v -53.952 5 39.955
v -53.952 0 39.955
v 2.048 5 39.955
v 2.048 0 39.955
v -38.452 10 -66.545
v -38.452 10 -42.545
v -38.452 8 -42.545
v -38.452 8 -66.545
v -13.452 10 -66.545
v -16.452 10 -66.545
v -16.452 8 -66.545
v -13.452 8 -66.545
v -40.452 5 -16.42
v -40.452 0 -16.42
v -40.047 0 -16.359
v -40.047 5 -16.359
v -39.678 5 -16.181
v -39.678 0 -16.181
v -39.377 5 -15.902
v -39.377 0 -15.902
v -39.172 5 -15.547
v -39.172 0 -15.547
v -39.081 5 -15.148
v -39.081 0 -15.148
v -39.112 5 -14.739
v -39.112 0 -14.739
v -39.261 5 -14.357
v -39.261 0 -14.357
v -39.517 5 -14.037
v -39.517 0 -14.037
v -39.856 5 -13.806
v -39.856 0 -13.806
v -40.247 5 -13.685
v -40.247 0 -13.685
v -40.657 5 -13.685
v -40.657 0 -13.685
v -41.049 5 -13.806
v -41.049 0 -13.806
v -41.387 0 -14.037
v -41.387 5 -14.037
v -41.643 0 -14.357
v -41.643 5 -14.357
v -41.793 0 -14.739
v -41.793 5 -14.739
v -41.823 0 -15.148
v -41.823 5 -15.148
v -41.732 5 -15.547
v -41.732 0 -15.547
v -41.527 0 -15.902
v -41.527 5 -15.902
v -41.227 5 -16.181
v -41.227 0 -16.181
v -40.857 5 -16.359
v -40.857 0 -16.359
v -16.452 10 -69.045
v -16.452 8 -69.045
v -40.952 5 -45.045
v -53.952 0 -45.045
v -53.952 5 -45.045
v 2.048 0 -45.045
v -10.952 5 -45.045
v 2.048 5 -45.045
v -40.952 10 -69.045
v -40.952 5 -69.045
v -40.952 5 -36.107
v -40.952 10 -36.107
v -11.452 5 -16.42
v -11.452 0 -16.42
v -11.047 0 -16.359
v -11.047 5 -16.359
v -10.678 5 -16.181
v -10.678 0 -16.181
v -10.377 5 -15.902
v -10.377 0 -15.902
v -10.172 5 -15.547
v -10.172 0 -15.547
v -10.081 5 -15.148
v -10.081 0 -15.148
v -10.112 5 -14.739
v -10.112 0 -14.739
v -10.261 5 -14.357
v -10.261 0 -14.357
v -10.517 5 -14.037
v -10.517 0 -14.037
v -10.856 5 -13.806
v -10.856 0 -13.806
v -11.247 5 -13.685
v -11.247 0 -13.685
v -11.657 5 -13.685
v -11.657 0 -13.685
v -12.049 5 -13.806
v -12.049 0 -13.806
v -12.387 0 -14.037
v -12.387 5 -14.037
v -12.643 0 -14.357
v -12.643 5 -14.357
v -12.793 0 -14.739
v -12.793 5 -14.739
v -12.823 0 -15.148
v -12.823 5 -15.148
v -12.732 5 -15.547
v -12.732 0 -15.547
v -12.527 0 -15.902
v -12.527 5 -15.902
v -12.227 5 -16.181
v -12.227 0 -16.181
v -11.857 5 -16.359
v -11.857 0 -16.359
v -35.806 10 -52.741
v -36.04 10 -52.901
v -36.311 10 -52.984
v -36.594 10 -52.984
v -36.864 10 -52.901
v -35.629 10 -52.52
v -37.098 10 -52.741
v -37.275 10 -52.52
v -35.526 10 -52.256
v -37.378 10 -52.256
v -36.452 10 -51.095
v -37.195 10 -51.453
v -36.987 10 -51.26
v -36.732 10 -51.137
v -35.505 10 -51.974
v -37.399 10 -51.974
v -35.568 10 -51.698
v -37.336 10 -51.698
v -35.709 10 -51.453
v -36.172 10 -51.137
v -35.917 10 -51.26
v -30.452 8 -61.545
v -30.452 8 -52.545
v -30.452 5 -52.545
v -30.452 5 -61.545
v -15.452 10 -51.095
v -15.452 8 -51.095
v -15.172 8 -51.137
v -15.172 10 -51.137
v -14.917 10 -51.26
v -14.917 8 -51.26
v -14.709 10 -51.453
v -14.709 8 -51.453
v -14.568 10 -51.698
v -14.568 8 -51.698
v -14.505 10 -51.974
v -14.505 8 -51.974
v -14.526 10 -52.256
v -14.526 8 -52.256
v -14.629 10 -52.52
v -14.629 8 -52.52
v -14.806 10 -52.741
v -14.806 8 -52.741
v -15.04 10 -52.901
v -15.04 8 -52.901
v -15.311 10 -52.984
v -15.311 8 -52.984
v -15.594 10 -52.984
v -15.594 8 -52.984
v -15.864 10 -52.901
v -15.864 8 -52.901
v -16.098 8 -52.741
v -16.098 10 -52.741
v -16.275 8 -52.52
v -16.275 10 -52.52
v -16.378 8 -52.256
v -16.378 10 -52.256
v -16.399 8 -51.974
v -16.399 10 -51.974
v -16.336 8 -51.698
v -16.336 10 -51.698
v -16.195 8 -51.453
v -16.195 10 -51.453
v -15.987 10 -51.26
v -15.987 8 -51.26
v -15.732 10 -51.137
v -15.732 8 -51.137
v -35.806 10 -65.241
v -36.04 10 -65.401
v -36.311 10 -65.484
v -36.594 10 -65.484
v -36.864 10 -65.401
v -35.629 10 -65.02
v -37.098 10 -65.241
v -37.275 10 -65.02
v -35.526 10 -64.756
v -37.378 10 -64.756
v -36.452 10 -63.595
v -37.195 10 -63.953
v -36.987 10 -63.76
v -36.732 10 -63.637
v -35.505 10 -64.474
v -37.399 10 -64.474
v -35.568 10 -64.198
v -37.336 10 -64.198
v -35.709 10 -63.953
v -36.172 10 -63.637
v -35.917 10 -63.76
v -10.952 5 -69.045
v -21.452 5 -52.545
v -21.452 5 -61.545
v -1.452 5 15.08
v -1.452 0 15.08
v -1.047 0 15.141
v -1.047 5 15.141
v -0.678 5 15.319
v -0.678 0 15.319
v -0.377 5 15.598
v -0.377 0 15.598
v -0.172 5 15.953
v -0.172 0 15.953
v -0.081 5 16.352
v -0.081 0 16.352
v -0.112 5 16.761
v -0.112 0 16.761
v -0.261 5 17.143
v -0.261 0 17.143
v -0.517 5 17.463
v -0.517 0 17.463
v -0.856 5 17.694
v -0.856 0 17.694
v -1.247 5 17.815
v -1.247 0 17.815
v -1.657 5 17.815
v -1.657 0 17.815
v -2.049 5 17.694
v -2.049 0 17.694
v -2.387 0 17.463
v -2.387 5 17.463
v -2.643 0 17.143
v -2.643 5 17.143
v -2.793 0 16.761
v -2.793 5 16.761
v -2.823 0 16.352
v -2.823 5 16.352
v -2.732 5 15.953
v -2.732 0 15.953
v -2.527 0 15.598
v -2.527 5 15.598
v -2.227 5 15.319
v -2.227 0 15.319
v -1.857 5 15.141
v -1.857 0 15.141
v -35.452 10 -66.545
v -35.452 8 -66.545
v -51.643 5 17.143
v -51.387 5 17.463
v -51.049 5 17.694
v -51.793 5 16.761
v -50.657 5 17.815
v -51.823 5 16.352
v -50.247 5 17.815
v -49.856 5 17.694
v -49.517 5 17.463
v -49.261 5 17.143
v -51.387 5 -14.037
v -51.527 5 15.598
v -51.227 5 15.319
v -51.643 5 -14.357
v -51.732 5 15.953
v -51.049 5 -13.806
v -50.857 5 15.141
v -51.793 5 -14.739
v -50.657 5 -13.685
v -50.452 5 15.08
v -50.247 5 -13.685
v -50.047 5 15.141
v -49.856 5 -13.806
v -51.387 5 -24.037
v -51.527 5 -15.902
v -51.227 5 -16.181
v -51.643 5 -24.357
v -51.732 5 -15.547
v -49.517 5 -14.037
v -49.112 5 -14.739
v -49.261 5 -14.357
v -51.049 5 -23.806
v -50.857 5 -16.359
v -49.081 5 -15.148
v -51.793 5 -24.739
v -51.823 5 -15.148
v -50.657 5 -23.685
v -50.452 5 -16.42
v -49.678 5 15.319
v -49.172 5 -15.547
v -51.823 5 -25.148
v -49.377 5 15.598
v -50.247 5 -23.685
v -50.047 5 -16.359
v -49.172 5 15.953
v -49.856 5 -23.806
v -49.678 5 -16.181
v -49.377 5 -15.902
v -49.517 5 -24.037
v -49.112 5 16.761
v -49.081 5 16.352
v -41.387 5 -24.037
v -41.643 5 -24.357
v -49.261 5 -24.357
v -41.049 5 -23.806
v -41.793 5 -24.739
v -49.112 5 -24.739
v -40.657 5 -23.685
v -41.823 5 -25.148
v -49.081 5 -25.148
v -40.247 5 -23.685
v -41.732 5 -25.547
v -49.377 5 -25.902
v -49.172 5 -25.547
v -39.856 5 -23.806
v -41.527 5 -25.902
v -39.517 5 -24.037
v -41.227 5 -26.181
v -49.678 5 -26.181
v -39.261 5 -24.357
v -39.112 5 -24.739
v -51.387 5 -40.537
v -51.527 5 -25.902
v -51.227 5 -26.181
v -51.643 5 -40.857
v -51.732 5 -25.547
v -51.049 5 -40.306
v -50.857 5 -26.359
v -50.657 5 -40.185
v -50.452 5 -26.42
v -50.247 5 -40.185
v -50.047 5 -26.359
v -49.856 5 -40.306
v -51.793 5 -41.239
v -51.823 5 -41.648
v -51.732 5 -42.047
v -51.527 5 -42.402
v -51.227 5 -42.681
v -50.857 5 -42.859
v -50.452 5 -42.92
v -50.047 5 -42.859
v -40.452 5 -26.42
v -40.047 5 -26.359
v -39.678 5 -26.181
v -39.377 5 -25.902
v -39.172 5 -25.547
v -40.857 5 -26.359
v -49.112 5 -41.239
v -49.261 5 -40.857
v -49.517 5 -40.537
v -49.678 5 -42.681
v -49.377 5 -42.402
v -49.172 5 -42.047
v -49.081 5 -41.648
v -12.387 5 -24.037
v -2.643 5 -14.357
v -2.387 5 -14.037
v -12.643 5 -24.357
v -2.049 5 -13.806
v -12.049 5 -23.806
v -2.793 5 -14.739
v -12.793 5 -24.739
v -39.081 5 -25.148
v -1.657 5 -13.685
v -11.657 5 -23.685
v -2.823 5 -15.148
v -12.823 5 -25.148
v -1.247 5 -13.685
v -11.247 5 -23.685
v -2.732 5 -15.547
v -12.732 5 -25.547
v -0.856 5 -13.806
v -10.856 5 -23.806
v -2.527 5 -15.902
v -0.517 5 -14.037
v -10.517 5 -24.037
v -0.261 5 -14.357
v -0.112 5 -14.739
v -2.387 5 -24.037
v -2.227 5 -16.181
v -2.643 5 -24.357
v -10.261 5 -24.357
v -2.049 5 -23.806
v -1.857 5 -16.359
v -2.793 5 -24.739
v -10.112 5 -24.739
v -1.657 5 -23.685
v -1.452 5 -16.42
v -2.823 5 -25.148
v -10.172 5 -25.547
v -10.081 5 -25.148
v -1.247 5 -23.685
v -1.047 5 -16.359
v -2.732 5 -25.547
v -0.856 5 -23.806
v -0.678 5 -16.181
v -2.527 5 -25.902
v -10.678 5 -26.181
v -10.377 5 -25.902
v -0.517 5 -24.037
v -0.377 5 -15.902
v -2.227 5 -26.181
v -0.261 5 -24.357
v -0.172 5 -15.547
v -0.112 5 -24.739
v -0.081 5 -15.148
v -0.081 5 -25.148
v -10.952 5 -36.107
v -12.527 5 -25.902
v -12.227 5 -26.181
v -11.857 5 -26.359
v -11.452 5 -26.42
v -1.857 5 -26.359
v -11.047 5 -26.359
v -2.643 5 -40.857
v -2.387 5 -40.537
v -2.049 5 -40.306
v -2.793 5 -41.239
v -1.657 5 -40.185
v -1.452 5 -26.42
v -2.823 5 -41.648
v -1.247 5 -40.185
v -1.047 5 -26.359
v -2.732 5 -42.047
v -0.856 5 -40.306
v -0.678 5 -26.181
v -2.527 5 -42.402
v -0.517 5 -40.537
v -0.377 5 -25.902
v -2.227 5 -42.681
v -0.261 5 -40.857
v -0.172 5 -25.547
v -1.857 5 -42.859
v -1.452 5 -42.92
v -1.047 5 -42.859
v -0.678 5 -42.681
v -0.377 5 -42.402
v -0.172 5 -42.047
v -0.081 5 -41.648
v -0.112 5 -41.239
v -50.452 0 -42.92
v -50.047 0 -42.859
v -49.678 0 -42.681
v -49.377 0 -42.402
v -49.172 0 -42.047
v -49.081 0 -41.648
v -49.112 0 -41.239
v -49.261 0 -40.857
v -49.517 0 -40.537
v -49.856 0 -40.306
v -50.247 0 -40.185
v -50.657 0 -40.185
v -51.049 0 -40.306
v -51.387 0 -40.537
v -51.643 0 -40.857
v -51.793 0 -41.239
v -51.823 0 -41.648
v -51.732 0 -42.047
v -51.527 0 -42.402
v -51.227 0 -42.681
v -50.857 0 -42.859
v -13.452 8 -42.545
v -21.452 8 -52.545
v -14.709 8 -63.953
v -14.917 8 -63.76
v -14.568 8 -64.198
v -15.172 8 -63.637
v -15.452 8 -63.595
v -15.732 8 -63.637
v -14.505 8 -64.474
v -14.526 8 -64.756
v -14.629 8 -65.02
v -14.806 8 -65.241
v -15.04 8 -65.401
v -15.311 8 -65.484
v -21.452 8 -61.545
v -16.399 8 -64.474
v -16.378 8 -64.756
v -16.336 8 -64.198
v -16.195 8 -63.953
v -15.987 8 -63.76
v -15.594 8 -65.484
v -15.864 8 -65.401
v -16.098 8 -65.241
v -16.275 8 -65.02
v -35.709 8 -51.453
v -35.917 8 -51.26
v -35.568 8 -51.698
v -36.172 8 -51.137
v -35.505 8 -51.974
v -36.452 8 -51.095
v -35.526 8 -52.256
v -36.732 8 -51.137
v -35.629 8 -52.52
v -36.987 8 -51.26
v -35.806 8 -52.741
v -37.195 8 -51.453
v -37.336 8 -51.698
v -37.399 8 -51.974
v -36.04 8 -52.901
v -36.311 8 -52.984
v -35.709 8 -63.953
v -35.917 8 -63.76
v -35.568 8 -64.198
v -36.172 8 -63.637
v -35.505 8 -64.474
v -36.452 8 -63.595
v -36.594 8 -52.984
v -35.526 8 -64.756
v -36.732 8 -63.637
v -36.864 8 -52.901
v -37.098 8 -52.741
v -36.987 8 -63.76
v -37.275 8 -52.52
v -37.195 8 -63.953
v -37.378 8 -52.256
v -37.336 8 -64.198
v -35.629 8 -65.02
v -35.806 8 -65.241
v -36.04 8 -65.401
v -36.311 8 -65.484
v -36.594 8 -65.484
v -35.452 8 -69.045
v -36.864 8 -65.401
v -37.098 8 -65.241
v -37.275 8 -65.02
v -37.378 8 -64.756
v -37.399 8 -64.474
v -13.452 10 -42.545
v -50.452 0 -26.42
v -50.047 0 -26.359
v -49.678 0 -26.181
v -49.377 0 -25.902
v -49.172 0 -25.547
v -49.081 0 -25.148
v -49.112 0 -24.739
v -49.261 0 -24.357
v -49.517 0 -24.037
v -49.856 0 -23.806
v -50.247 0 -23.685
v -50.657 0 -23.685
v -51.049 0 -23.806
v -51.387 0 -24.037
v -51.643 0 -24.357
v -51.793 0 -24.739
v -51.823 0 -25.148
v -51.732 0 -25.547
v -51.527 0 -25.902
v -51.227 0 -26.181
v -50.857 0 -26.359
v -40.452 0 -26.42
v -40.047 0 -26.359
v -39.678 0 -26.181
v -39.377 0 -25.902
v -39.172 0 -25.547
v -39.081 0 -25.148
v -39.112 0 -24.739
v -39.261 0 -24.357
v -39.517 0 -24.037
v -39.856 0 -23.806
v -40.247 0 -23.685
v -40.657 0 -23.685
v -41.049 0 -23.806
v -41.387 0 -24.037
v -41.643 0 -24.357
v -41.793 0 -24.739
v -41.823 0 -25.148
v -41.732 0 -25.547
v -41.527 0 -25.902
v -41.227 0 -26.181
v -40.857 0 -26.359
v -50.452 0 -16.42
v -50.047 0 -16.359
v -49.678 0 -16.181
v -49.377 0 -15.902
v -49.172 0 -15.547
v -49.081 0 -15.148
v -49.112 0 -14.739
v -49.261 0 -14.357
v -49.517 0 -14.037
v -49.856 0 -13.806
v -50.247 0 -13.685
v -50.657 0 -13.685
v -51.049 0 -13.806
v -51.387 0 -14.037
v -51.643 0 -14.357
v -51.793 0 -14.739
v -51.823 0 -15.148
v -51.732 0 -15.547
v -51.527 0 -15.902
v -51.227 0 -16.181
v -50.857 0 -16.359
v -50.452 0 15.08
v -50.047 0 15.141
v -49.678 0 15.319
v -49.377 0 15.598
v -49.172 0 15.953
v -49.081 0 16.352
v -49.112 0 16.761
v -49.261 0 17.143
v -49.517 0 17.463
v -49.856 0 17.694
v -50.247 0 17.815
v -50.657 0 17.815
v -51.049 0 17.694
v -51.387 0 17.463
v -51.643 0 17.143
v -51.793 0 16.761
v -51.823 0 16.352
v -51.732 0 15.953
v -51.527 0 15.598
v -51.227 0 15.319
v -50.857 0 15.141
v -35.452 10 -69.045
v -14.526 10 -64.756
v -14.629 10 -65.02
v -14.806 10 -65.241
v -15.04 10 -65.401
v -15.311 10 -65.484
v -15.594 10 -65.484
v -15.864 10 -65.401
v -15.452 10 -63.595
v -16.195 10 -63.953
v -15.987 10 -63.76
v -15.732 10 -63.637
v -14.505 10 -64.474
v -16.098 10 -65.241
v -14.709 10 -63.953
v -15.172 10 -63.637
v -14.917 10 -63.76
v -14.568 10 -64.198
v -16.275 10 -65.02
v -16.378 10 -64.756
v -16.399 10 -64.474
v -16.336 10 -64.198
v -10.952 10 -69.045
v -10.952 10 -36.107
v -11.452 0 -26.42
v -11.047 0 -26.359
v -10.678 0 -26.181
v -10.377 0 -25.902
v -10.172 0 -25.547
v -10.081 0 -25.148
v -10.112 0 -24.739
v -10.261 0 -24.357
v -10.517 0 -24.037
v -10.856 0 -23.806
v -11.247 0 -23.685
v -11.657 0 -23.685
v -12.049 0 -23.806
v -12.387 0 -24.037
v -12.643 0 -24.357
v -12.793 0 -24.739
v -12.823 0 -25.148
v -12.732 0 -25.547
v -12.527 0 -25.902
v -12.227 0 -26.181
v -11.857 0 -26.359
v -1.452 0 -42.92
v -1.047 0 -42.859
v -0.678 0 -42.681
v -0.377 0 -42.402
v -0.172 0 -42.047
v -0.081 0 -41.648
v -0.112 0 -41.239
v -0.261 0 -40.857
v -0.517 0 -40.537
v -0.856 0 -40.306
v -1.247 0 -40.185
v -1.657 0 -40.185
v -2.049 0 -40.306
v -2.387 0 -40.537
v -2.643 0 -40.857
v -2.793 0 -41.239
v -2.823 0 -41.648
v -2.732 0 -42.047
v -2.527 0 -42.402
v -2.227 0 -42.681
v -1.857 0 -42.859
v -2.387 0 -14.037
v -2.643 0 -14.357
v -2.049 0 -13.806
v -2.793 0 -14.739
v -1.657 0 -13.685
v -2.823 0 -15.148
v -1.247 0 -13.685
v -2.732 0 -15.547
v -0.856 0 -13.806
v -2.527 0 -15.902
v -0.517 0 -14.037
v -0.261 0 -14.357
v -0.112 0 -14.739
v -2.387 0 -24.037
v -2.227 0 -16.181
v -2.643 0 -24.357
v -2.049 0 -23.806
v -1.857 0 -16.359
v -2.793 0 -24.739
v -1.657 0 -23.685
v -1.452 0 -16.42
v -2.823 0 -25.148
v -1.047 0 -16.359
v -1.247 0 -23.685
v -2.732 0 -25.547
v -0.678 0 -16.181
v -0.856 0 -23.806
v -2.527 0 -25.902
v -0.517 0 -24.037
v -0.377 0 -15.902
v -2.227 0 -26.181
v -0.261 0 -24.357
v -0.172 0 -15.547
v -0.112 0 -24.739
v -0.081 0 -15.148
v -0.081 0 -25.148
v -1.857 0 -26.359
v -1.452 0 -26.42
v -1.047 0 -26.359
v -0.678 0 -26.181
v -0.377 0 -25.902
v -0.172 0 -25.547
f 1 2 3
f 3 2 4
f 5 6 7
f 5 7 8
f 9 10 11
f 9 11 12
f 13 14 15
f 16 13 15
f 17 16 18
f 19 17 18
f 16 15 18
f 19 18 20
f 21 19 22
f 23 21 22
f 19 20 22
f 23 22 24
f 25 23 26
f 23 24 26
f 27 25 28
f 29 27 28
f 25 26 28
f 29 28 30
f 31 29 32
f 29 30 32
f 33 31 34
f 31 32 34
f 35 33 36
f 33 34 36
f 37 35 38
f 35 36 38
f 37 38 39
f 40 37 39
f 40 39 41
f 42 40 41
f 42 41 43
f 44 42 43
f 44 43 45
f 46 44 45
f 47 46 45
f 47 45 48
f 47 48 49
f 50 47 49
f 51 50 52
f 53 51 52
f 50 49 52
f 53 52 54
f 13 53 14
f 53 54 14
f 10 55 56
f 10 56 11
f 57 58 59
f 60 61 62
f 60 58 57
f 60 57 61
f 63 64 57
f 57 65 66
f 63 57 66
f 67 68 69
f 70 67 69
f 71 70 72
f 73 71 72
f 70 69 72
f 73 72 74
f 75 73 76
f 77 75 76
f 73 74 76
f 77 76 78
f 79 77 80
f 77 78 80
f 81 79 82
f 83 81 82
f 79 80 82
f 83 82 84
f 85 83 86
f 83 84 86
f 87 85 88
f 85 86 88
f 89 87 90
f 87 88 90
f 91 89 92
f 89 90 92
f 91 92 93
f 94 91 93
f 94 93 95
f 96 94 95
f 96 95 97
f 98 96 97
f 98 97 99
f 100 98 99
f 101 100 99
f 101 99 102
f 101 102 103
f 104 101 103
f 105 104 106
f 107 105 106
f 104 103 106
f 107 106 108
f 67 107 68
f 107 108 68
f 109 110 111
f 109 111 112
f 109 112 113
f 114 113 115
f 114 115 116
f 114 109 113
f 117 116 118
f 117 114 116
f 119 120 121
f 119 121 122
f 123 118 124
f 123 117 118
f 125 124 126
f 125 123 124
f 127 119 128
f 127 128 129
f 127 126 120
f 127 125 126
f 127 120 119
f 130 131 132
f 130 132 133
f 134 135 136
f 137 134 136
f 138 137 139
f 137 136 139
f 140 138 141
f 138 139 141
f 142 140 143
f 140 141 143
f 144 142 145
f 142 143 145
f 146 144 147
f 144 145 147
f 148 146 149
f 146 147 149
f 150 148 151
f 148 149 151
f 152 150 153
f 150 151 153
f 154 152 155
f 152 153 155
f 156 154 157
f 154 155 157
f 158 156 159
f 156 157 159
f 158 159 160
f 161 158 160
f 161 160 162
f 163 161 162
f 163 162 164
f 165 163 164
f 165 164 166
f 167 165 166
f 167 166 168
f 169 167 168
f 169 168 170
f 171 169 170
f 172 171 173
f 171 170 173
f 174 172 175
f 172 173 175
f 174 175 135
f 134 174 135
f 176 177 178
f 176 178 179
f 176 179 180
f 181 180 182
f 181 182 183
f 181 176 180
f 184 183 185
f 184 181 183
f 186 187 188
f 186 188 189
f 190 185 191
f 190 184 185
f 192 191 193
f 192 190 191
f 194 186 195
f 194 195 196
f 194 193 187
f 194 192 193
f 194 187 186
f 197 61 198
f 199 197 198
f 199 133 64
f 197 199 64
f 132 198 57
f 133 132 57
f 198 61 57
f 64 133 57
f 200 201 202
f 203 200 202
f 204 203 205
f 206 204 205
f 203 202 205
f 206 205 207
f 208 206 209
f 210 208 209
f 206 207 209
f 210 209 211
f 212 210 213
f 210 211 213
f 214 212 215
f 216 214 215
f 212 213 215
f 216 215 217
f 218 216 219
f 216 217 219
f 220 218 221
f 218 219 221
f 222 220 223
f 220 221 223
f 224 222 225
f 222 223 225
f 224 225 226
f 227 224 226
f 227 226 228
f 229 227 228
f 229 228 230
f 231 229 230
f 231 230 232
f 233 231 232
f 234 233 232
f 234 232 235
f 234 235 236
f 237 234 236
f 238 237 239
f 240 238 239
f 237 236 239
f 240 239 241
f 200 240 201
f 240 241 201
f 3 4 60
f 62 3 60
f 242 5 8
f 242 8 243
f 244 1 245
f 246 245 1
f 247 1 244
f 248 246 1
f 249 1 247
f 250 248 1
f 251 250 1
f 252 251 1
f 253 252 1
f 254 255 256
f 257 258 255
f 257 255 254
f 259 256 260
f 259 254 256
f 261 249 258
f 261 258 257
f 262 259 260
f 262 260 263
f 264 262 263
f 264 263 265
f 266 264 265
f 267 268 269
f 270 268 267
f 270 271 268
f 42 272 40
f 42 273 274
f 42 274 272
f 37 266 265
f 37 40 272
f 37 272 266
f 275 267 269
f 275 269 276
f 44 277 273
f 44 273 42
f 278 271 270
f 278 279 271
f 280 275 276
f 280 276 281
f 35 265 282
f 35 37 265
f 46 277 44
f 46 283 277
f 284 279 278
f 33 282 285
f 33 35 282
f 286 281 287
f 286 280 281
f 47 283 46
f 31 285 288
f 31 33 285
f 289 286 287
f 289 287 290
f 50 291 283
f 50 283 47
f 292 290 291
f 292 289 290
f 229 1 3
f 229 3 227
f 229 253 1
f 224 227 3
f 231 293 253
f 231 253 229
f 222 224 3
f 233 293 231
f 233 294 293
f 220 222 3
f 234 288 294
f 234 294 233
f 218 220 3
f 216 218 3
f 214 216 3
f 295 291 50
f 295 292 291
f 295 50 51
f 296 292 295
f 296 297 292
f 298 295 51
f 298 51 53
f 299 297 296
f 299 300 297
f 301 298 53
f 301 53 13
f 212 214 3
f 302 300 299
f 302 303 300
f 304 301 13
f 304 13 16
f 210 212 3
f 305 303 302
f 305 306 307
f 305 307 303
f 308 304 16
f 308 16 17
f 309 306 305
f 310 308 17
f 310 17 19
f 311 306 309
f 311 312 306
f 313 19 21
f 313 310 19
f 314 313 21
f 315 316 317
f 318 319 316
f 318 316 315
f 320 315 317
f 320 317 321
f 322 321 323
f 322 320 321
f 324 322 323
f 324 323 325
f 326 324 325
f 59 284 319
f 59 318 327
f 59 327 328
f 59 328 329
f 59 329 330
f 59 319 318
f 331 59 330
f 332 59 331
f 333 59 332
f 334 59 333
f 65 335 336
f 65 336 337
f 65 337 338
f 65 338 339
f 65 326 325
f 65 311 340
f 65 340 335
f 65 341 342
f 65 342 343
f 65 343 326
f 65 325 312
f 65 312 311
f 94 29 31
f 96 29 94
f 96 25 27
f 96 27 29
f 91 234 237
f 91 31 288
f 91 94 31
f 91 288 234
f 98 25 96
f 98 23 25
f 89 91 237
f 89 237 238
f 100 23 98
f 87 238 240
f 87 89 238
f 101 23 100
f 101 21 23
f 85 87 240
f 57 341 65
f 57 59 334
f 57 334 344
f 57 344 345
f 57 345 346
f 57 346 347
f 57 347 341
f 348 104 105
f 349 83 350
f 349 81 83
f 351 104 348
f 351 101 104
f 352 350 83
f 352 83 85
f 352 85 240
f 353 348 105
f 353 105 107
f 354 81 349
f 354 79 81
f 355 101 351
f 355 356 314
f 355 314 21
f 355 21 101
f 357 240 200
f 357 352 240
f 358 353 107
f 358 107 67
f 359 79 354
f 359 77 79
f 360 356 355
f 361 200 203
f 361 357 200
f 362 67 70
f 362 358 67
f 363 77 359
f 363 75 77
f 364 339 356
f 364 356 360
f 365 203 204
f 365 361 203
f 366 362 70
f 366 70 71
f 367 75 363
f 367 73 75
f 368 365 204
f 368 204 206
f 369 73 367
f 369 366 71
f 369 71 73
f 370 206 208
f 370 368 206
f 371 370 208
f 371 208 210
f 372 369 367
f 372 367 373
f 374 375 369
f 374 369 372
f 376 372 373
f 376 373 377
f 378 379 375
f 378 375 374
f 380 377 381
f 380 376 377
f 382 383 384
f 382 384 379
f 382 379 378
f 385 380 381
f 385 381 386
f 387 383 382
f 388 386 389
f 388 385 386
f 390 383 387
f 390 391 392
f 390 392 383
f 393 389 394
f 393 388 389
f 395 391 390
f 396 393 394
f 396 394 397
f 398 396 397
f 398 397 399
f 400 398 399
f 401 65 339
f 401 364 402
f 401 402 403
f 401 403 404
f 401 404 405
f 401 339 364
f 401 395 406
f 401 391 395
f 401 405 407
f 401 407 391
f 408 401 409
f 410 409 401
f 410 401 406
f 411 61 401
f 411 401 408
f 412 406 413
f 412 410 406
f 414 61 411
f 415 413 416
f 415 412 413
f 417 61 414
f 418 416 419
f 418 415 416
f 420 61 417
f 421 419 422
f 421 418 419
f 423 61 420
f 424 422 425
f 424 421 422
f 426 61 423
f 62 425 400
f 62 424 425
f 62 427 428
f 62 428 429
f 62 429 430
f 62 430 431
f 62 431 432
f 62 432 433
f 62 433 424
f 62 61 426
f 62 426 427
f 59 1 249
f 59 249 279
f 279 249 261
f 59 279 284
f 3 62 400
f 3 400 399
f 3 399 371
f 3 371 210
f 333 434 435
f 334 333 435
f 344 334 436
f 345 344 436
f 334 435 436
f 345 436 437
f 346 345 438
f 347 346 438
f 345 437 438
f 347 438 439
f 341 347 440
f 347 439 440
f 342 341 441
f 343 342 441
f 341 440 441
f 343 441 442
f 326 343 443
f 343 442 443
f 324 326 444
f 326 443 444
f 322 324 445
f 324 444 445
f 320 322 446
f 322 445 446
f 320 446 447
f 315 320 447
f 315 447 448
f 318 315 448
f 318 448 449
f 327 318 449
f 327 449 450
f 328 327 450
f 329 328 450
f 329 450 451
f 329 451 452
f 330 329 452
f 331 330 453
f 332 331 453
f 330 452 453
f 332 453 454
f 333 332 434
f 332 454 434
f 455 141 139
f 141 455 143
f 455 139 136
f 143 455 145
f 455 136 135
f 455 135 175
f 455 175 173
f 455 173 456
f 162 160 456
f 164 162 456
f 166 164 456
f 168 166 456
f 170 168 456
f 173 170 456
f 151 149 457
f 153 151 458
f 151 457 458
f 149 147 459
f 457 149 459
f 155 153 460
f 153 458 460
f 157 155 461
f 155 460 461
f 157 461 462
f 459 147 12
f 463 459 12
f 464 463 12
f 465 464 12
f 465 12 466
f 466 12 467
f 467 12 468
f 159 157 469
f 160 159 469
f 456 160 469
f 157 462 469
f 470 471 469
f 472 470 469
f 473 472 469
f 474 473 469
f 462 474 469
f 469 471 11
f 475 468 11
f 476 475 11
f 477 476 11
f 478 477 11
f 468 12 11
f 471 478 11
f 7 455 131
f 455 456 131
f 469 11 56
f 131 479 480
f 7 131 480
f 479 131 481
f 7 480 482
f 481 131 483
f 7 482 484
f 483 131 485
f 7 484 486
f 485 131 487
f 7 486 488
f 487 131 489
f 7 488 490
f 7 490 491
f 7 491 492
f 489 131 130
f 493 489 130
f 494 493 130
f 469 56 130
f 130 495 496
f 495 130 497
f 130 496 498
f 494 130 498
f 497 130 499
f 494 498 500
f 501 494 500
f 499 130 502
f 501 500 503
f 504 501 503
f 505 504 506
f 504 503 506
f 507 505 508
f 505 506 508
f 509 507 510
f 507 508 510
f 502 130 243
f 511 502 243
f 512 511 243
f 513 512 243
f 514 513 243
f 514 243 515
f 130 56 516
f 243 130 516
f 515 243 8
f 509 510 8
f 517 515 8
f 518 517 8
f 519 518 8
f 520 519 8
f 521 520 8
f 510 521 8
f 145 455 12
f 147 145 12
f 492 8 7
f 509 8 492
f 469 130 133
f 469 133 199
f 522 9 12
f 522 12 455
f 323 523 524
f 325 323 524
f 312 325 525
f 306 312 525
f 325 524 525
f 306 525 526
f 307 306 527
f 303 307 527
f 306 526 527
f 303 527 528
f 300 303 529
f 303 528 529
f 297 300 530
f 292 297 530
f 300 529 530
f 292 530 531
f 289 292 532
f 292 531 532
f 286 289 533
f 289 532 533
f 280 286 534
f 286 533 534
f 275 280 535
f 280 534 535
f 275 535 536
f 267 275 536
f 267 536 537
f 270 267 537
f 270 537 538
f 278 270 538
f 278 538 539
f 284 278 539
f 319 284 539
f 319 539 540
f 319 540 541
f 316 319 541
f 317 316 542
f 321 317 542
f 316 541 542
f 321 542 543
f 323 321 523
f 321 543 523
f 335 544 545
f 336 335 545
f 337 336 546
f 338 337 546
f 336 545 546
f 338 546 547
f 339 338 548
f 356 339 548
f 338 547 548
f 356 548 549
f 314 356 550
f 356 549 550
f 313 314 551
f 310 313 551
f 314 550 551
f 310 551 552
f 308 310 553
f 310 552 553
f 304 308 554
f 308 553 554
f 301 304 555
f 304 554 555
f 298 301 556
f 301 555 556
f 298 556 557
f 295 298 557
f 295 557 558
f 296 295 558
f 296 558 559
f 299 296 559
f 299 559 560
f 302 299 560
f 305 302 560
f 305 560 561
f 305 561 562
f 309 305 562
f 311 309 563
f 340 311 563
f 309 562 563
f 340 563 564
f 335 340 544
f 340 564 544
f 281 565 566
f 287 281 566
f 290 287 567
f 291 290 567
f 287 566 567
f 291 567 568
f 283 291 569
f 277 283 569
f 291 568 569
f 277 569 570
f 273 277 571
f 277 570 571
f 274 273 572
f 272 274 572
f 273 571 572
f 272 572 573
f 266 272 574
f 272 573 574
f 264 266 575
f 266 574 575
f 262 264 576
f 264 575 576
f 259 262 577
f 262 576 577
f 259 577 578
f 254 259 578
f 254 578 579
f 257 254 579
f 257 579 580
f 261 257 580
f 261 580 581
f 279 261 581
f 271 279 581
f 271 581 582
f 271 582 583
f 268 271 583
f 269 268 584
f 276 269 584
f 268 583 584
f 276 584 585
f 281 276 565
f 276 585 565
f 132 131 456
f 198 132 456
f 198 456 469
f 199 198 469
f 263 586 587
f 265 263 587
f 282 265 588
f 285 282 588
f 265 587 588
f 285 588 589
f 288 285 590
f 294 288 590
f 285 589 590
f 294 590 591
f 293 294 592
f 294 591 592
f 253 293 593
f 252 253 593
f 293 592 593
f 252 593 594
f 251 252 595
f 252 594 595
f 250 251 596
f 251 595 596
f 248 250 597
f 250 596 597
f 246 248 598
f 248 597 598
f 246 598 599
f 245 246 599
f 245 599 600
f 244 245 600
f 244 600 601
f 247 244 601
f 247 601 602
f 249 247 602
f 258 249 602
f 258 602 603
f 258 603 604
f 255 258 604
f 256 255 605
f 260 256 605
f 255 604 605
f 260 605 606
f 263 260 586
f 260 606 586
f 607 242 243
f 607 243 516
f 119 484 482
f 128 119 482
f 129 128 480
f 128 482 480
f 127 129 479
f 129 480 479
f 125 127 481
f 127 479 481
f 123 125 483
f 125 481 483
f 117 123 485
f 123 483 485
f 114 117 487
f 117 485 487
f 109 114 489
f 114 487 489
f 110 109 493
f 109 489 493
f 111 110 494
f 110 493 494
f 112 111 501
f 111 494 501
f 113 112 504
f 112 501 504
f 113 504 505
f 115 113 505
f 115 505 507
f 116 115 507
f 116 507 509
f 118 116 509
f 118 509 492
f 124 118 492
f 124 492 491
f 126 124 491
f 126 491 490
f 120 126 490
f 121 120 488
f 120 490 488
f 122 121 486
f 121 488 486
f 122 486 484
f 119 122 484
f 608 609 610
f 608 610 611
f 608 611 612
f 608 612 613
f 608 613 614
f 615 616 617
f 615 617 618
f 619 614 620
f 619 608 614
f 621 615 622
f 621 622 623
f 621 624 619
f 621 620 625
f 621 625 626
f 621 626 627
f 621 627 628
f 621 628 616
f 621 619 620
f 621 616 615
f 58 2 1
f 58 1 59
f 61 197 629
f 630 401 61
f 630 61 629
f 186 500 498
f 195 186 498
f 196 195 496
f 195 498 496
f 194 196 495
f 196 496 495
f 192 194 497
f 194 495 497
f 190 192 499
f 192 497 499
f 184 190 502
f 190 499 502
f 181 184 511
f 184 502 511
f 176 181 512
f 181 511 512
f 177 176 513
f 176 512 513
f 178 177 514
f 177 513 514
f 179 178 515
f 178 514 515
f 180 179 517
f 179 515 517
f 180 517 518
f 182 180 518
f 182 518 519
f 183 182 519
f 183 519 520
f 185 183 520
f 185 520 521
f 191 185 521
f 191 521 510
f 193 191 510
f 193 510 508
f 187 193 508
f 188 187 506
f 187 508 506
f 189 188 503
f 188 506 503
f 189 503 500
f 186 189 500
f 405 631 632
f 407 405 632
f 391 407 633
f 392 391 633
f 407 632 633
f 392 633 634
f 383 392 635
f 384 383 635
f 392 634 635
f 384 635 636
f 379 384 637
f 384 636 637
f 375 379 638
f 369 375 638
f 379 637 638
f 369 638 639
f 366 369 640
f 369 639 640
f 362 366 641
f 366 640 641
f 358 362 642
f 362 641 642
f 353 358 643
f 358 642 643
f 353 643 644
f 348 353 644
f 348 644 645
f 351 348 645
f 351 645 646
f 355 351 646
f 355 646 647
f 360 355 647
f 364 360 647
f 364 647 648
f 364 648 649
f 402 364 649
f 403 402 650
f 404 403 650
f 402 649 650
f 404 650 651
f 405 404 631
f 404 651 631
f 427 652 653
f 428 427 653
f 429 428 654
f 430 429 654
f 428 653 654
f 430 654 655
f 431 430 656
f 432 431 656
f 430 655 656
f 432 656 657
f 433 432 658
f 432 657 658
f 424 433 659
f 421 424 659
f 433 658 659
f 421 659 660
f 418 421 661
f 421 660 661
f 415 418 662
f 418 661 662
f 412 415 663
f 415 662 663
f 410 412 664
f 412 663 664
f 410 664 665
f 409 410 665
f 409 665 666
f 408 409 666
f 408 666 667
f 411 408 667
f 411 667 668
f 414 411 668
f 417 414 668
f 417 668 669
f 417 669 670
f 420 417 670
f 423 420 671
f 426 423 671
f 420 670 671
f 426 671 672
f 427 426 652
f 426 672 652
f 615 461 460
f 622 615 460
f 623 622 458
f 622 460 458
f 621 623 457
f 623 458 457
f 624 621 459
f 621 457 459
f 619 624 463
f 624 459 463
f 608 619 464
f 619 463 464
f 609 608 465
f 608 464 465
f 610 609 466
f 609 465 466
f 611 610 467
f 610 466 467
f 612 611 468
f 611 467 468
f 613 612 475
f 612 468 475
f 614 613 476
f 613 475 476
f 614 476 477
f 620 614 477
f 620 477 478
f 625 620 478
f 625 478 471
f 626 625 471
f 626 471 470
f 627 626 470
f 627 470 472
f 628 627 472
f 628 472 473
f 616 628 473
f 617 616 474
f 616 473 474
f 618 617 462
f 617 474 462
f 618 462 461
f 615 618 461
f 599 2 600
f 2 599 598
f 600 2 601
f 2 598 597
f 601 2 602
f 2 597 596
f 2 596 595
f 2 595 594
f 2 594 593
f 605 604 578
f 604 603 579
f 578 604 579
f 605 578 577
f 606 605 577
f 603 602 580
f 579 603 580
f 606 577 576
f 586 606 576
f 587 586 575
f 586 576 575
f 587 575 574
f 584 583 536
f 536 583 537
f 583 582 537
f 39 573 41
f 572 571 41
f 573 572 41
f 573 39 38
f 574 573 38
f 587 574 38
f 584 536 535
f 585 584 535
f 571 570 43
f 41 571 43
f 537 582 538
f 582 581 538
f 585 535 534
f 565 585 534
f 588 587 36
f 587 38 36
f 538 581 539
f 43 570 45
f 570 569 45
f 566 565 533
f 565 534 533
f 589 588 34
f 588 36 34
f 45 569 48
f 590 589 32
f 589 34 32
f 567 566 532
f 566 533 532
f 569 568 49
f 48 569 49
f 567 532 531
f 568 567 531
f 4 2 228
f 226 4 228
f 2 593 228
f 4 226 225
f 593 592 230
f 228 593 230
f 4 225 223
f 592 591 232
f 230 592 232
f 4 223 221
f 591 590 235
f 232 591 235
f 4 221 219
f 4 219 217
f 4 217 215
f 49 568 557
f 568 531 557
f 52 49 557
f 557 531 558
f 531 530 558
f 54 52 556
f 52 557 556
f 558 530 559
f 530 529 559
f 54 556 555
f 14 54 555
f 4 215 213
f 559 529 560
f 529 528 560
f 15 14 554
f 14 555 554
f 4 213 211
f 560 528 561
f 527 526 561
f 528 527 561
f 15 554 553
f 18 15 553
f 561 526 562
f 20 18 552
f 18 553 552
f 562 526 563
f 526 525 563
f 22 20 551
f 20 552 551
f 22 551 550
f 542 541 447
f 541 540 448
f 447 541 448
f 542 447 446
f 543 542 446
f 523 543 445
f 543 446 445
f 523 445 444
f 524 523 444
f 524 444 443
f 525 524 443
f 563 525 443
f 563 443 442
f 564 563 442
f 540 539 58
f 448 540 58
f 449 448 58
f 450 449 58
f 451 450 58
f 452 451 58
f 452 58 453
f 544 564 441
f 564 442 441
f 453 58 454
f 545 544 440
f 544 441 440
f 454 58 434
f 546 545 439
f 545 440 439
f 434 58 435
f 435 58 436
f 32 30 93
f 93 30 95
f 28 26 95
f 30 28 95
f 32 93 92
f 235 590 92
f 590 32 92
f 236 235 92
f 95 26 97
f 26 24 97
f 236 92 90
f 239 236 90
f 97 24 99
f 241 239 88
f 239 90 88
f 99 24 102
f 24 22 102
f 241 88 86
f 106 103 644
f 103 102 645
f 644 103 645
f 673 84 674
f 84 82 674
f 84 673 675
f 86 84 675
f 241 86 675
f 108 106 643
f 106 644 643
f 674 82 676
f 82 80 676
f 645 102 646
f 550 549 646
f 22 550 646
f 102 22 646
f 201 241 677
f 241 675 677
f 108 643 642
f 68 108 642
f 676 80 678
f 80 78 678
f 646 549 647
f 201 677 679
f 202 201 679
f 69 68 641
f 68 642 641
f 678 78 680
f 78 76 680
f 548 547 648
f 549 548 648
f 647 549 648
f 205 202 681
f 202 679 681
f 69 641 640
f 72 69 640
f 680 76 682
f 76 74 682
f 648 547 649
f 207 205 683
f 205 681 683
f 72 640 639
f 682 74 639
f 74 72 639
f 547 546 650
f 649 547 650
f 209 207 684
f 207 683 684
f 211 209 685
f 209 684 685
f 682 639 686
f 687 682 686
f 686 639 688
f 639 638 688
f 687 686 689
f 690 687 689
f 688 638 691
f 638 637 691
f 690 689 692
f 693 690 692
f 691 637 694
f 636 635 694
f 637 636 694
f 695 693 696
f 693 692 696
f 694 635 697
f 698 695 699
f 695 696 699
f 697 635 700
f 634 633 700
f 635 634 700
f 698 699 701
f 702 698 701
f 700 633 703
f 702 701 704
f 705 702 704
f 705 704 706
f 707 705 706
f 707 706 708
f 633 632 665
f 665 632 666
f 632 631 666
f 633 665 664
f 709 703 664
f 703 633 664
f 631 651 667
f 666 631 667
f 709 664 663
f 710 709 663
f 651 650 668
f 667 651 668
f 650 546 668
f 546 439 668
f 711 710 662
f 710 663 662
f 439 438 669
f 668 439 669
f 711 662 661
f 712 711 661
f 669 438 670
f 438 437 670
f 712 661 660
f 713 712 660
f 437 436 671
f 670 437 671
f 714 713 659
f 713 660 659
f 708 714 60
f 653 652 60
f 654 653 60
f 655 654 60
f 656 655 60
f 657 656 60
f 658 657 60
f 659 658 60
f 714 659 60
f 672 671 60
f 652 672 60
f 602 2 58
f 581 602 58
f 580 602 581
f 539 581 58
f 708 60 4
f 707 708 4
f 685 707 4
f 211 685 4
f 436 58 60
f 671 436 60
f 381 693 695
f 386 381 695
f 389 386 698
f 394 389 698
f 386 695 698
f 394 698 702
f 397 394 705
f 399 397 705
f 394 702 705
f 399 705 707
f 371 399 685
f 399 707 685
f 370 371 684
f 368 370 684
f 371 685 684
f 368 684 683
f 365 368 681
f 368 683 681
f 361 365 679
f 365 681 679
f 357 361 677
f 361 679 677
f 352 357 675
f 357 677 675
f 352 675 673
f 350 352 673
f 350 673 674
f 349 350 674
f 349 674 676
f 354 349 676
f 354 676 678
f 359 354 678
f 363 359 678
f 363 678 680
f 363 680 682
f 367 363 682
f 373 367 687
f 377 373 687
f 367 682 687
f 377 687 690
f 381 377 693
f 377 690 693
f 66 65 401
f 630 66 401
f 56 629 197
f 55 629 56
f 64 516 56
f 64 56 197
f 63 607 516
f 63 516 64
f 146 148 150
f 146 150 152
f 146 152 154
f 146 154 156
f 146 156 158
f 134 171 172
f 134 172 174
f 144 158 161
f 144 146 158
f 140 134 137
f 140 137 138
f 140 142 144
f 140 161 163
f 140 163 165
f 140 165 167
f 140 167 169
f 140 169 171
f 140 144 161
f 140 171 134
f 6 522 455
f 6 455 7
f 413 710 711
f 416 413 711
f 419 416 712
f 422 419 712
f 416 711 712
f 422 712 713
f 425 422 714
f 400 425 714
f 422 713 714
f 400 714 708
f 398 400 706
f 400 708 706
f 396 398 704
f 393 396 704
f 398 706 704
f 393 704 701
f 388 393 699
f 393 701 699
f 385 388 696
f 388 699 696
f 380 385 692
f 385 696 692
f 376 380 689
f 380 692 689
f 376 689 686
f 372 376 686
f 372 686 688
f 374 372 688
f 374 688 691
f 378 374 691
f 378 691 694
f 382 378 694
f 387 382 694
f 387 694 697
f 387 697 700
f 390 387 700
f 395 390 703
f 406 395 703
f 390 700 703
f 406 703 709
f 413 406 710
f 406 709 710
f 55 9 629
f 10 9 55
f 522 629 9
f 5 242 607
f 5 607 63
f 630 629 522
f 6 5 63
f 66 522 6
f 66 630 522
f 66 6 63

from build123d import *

# Parameters (mm, degrees)
SKETCH1_W           = 56
SKETCH1_H           = 85
BOSS_EXTRUDE1_DEPTH = 5
SKETCH2_R           = 1.375
CUT_EXTRUDE1_DEPTH  = 5
SKETCH3_R           = 1.375
CUT_EXTRUDE2_DEPTH  = 5
SKETCH5_W           = 30
SKETCH5_H           = 8.938360197
BOSS_EXTRUDE2_DEPTH = 5
SKETCH6_W           = 30
SKETCH6_H           = 5
BOSS_EXTRUDE3_DEPTH = 24
CUT_EXTRUDE3_DEPTH  = 2
SKETCH9_W           = 9
SKETCH9_H           = 9
CUT_EXTRUDE4_DEPTH  = 3
SKETCH10_R          = 0.95
BOSS_EXTRUDE4_DEPTH = 2


with BuildPart() as part:
    # Sketch1 → Boss-Extrude1 (new body)
    with BuildSketch(Plane(origin=(0, 0, 0), x_dir=(1, 0, 0), z_dir=(0, 1, 0))):
        with Locations((-25.952095808, 2.54491018)):
            Rectangle(SKETCH1_W, SKETCH1_H)
    extrude(amount=BOSS_EXTRUDE1_DEPTH)

    # Sketch2 → Cut-Extrude1 (cut)
    with BuildSketch(Plane(origin=(0, 0, 0), x_dir=(-1, 0, 0), z_dir=(0, -1, 0))):
        with Locations(Location((50.452095808, 41.54491018, 0), (0, 0, 90))):
            Circle(SKETCH2_R)
        with Locations(Location((1.452095808, 41.54491018, 0), (0, 0, 90))):
            Circle(SKETCH2_R)
        with Locations(Location((50.452095808, -16.45508982, 0), (0, 0, 90))):
            Circle(SKETCH2_R)
        with Locations(Location((1.452095808, -16.45508982, 0), (0, 0, 90))):
            Circle(SKETCH2_R)
    extrude(amount=-CUT_EXTRUDE1_DEPTH, mode=Mode.SUBTRACT)

    # Sketch3 → Cut-Extrude2 (cut)
    with BuildSketch(Plane(origin=(0, 0, 0), x_dir=(-1, 0, 0), z_dir=(0, -1, 0))):
        with Locations(Location((50.452095808, 25.04491018, 0), (0, 0, 90))):
            Circle(SKETCH3_R)
        with Locations(Location((50.452095808, 15.04491018, 0), (0, 0, 90))):
            Circle(SKETCH3_R)
        with Locations(Location((40.452095808, 15.04491018, 0), (0, 0, 90))):
            Circle(SKETCH3_R)
        with Locations(Location((40.452095808, 25.04491018, 0), (0, 0, 90))):
            Circle(SKETCH3_R)
        with Locations(Location((1.452095808, 25.04491018, 0), (0, 0, 90))):
            Circle(SKETCH3_R)
        with Locations(Location((11.452095808, 25.04491018, 0), (0, 0, 90))):
            Circle(SKETCH3_R)
        with Locations(Location((1.452095808, 15.04491018, 0), (0, 0, 90))):
            Circle(SKETCH3_R)
        with Locations(Location((11.452095808, 15.04491018, 0), (0, 0, 90))):
            Circle(SKETCH3_R)
    extrude(amount=-CUT_EXTRUDE2_DEPTH, mode=Mode.SUBTRACT)

    # Sketch5 → Boss-Extrude2 (add)
    with BuildSketch(Plane(origin=(0, 5, 0), x_dir=(1, 0, 0), z_dir=(0, 1, 0))):
        with Locations((-25.952095808, 40.575730081)):
            Rectangle(SKETCH5_W, SKETCH5_H)
    extrude(amount=BOSS_EXTRUDE2_DEPTH)

    # Sketch6 → Boss-Extrude3 (add)
    with BuildSketch(Plane(origin=(0, 0, -45.04491018), x_dir=(-1, 0, 0), z_dir=(0, 0, -1))):
        with Locations((25.952095808, 7.5)):
            Rectangle(SKETCH6_W, SKETCH6_H)
    extrude(amount=BOSS_EXTRUDE3_DEPTH)

    # Sketch8 → Cut-Extrude3 (cut)
    with BuildSketch(Plane(origin=(0, 10, 0), x_dir=(1, 0, 0), z_dir=(0, 1, 0))):
        Polygon((-38.452095808, 66.54491018), (-35.452095808, 66.54491018), (-35.452095808, 69.04491018), (-16.452095808, 69.04491018), (-16.452095808, 66.54491018), (-13.452095808, 66.54491018), (-13.452095808, 42.54491018), (-38.452095808, 42.54491018), align=None)
    extrude(amount=-CUT_EXTRUDE3_DEPTH, mode=Mode.SUBTRACT)

    # Sketch9 → Cut-Extrude4 (cut)
    with BuildSketch(Plane(origin=(0, 8, 0), x_dir=(1, 0, 0), z_dir=(0, 1, 0))):
        with Locations((-25.952095808, 57.04491018)):
            Rectangle(SKETCH9_W, SKETCH9_H)
    extrude(amount=-CUT_EXTRUDE4_DEPTH, mode=Mode.SUBTRACT)

    # Sketch10 → Boss-Extrude4 (add)
    with BuildSketch(Plane(origin=(0, 8, 0), x_dir=(1, 0, 0), z_dir=(0, 1, 0))):
        with Locations(Location((-36.452095808, 64.54491018, 0), (0, 0, 270))):
            Circle(SKETCH10_R)
        with Locations(Location((-15.452095808, 64.54491018, 0), (0, 0, 270))):
            Circle(SKETCH10_R)
        with Locations(Location((-15.452095808, 52.04491018, 0), (0, 0, 270))):
            Circle(SKETCH10_R)
        with Locations(Location((-36.452095808, 52.04491018, 0), (0, 0, 270))):
            Circle(SKETCH10_R)
    extrude(amount=BOSS_EXTRUDE4_DEPTH)


solid = part.part
